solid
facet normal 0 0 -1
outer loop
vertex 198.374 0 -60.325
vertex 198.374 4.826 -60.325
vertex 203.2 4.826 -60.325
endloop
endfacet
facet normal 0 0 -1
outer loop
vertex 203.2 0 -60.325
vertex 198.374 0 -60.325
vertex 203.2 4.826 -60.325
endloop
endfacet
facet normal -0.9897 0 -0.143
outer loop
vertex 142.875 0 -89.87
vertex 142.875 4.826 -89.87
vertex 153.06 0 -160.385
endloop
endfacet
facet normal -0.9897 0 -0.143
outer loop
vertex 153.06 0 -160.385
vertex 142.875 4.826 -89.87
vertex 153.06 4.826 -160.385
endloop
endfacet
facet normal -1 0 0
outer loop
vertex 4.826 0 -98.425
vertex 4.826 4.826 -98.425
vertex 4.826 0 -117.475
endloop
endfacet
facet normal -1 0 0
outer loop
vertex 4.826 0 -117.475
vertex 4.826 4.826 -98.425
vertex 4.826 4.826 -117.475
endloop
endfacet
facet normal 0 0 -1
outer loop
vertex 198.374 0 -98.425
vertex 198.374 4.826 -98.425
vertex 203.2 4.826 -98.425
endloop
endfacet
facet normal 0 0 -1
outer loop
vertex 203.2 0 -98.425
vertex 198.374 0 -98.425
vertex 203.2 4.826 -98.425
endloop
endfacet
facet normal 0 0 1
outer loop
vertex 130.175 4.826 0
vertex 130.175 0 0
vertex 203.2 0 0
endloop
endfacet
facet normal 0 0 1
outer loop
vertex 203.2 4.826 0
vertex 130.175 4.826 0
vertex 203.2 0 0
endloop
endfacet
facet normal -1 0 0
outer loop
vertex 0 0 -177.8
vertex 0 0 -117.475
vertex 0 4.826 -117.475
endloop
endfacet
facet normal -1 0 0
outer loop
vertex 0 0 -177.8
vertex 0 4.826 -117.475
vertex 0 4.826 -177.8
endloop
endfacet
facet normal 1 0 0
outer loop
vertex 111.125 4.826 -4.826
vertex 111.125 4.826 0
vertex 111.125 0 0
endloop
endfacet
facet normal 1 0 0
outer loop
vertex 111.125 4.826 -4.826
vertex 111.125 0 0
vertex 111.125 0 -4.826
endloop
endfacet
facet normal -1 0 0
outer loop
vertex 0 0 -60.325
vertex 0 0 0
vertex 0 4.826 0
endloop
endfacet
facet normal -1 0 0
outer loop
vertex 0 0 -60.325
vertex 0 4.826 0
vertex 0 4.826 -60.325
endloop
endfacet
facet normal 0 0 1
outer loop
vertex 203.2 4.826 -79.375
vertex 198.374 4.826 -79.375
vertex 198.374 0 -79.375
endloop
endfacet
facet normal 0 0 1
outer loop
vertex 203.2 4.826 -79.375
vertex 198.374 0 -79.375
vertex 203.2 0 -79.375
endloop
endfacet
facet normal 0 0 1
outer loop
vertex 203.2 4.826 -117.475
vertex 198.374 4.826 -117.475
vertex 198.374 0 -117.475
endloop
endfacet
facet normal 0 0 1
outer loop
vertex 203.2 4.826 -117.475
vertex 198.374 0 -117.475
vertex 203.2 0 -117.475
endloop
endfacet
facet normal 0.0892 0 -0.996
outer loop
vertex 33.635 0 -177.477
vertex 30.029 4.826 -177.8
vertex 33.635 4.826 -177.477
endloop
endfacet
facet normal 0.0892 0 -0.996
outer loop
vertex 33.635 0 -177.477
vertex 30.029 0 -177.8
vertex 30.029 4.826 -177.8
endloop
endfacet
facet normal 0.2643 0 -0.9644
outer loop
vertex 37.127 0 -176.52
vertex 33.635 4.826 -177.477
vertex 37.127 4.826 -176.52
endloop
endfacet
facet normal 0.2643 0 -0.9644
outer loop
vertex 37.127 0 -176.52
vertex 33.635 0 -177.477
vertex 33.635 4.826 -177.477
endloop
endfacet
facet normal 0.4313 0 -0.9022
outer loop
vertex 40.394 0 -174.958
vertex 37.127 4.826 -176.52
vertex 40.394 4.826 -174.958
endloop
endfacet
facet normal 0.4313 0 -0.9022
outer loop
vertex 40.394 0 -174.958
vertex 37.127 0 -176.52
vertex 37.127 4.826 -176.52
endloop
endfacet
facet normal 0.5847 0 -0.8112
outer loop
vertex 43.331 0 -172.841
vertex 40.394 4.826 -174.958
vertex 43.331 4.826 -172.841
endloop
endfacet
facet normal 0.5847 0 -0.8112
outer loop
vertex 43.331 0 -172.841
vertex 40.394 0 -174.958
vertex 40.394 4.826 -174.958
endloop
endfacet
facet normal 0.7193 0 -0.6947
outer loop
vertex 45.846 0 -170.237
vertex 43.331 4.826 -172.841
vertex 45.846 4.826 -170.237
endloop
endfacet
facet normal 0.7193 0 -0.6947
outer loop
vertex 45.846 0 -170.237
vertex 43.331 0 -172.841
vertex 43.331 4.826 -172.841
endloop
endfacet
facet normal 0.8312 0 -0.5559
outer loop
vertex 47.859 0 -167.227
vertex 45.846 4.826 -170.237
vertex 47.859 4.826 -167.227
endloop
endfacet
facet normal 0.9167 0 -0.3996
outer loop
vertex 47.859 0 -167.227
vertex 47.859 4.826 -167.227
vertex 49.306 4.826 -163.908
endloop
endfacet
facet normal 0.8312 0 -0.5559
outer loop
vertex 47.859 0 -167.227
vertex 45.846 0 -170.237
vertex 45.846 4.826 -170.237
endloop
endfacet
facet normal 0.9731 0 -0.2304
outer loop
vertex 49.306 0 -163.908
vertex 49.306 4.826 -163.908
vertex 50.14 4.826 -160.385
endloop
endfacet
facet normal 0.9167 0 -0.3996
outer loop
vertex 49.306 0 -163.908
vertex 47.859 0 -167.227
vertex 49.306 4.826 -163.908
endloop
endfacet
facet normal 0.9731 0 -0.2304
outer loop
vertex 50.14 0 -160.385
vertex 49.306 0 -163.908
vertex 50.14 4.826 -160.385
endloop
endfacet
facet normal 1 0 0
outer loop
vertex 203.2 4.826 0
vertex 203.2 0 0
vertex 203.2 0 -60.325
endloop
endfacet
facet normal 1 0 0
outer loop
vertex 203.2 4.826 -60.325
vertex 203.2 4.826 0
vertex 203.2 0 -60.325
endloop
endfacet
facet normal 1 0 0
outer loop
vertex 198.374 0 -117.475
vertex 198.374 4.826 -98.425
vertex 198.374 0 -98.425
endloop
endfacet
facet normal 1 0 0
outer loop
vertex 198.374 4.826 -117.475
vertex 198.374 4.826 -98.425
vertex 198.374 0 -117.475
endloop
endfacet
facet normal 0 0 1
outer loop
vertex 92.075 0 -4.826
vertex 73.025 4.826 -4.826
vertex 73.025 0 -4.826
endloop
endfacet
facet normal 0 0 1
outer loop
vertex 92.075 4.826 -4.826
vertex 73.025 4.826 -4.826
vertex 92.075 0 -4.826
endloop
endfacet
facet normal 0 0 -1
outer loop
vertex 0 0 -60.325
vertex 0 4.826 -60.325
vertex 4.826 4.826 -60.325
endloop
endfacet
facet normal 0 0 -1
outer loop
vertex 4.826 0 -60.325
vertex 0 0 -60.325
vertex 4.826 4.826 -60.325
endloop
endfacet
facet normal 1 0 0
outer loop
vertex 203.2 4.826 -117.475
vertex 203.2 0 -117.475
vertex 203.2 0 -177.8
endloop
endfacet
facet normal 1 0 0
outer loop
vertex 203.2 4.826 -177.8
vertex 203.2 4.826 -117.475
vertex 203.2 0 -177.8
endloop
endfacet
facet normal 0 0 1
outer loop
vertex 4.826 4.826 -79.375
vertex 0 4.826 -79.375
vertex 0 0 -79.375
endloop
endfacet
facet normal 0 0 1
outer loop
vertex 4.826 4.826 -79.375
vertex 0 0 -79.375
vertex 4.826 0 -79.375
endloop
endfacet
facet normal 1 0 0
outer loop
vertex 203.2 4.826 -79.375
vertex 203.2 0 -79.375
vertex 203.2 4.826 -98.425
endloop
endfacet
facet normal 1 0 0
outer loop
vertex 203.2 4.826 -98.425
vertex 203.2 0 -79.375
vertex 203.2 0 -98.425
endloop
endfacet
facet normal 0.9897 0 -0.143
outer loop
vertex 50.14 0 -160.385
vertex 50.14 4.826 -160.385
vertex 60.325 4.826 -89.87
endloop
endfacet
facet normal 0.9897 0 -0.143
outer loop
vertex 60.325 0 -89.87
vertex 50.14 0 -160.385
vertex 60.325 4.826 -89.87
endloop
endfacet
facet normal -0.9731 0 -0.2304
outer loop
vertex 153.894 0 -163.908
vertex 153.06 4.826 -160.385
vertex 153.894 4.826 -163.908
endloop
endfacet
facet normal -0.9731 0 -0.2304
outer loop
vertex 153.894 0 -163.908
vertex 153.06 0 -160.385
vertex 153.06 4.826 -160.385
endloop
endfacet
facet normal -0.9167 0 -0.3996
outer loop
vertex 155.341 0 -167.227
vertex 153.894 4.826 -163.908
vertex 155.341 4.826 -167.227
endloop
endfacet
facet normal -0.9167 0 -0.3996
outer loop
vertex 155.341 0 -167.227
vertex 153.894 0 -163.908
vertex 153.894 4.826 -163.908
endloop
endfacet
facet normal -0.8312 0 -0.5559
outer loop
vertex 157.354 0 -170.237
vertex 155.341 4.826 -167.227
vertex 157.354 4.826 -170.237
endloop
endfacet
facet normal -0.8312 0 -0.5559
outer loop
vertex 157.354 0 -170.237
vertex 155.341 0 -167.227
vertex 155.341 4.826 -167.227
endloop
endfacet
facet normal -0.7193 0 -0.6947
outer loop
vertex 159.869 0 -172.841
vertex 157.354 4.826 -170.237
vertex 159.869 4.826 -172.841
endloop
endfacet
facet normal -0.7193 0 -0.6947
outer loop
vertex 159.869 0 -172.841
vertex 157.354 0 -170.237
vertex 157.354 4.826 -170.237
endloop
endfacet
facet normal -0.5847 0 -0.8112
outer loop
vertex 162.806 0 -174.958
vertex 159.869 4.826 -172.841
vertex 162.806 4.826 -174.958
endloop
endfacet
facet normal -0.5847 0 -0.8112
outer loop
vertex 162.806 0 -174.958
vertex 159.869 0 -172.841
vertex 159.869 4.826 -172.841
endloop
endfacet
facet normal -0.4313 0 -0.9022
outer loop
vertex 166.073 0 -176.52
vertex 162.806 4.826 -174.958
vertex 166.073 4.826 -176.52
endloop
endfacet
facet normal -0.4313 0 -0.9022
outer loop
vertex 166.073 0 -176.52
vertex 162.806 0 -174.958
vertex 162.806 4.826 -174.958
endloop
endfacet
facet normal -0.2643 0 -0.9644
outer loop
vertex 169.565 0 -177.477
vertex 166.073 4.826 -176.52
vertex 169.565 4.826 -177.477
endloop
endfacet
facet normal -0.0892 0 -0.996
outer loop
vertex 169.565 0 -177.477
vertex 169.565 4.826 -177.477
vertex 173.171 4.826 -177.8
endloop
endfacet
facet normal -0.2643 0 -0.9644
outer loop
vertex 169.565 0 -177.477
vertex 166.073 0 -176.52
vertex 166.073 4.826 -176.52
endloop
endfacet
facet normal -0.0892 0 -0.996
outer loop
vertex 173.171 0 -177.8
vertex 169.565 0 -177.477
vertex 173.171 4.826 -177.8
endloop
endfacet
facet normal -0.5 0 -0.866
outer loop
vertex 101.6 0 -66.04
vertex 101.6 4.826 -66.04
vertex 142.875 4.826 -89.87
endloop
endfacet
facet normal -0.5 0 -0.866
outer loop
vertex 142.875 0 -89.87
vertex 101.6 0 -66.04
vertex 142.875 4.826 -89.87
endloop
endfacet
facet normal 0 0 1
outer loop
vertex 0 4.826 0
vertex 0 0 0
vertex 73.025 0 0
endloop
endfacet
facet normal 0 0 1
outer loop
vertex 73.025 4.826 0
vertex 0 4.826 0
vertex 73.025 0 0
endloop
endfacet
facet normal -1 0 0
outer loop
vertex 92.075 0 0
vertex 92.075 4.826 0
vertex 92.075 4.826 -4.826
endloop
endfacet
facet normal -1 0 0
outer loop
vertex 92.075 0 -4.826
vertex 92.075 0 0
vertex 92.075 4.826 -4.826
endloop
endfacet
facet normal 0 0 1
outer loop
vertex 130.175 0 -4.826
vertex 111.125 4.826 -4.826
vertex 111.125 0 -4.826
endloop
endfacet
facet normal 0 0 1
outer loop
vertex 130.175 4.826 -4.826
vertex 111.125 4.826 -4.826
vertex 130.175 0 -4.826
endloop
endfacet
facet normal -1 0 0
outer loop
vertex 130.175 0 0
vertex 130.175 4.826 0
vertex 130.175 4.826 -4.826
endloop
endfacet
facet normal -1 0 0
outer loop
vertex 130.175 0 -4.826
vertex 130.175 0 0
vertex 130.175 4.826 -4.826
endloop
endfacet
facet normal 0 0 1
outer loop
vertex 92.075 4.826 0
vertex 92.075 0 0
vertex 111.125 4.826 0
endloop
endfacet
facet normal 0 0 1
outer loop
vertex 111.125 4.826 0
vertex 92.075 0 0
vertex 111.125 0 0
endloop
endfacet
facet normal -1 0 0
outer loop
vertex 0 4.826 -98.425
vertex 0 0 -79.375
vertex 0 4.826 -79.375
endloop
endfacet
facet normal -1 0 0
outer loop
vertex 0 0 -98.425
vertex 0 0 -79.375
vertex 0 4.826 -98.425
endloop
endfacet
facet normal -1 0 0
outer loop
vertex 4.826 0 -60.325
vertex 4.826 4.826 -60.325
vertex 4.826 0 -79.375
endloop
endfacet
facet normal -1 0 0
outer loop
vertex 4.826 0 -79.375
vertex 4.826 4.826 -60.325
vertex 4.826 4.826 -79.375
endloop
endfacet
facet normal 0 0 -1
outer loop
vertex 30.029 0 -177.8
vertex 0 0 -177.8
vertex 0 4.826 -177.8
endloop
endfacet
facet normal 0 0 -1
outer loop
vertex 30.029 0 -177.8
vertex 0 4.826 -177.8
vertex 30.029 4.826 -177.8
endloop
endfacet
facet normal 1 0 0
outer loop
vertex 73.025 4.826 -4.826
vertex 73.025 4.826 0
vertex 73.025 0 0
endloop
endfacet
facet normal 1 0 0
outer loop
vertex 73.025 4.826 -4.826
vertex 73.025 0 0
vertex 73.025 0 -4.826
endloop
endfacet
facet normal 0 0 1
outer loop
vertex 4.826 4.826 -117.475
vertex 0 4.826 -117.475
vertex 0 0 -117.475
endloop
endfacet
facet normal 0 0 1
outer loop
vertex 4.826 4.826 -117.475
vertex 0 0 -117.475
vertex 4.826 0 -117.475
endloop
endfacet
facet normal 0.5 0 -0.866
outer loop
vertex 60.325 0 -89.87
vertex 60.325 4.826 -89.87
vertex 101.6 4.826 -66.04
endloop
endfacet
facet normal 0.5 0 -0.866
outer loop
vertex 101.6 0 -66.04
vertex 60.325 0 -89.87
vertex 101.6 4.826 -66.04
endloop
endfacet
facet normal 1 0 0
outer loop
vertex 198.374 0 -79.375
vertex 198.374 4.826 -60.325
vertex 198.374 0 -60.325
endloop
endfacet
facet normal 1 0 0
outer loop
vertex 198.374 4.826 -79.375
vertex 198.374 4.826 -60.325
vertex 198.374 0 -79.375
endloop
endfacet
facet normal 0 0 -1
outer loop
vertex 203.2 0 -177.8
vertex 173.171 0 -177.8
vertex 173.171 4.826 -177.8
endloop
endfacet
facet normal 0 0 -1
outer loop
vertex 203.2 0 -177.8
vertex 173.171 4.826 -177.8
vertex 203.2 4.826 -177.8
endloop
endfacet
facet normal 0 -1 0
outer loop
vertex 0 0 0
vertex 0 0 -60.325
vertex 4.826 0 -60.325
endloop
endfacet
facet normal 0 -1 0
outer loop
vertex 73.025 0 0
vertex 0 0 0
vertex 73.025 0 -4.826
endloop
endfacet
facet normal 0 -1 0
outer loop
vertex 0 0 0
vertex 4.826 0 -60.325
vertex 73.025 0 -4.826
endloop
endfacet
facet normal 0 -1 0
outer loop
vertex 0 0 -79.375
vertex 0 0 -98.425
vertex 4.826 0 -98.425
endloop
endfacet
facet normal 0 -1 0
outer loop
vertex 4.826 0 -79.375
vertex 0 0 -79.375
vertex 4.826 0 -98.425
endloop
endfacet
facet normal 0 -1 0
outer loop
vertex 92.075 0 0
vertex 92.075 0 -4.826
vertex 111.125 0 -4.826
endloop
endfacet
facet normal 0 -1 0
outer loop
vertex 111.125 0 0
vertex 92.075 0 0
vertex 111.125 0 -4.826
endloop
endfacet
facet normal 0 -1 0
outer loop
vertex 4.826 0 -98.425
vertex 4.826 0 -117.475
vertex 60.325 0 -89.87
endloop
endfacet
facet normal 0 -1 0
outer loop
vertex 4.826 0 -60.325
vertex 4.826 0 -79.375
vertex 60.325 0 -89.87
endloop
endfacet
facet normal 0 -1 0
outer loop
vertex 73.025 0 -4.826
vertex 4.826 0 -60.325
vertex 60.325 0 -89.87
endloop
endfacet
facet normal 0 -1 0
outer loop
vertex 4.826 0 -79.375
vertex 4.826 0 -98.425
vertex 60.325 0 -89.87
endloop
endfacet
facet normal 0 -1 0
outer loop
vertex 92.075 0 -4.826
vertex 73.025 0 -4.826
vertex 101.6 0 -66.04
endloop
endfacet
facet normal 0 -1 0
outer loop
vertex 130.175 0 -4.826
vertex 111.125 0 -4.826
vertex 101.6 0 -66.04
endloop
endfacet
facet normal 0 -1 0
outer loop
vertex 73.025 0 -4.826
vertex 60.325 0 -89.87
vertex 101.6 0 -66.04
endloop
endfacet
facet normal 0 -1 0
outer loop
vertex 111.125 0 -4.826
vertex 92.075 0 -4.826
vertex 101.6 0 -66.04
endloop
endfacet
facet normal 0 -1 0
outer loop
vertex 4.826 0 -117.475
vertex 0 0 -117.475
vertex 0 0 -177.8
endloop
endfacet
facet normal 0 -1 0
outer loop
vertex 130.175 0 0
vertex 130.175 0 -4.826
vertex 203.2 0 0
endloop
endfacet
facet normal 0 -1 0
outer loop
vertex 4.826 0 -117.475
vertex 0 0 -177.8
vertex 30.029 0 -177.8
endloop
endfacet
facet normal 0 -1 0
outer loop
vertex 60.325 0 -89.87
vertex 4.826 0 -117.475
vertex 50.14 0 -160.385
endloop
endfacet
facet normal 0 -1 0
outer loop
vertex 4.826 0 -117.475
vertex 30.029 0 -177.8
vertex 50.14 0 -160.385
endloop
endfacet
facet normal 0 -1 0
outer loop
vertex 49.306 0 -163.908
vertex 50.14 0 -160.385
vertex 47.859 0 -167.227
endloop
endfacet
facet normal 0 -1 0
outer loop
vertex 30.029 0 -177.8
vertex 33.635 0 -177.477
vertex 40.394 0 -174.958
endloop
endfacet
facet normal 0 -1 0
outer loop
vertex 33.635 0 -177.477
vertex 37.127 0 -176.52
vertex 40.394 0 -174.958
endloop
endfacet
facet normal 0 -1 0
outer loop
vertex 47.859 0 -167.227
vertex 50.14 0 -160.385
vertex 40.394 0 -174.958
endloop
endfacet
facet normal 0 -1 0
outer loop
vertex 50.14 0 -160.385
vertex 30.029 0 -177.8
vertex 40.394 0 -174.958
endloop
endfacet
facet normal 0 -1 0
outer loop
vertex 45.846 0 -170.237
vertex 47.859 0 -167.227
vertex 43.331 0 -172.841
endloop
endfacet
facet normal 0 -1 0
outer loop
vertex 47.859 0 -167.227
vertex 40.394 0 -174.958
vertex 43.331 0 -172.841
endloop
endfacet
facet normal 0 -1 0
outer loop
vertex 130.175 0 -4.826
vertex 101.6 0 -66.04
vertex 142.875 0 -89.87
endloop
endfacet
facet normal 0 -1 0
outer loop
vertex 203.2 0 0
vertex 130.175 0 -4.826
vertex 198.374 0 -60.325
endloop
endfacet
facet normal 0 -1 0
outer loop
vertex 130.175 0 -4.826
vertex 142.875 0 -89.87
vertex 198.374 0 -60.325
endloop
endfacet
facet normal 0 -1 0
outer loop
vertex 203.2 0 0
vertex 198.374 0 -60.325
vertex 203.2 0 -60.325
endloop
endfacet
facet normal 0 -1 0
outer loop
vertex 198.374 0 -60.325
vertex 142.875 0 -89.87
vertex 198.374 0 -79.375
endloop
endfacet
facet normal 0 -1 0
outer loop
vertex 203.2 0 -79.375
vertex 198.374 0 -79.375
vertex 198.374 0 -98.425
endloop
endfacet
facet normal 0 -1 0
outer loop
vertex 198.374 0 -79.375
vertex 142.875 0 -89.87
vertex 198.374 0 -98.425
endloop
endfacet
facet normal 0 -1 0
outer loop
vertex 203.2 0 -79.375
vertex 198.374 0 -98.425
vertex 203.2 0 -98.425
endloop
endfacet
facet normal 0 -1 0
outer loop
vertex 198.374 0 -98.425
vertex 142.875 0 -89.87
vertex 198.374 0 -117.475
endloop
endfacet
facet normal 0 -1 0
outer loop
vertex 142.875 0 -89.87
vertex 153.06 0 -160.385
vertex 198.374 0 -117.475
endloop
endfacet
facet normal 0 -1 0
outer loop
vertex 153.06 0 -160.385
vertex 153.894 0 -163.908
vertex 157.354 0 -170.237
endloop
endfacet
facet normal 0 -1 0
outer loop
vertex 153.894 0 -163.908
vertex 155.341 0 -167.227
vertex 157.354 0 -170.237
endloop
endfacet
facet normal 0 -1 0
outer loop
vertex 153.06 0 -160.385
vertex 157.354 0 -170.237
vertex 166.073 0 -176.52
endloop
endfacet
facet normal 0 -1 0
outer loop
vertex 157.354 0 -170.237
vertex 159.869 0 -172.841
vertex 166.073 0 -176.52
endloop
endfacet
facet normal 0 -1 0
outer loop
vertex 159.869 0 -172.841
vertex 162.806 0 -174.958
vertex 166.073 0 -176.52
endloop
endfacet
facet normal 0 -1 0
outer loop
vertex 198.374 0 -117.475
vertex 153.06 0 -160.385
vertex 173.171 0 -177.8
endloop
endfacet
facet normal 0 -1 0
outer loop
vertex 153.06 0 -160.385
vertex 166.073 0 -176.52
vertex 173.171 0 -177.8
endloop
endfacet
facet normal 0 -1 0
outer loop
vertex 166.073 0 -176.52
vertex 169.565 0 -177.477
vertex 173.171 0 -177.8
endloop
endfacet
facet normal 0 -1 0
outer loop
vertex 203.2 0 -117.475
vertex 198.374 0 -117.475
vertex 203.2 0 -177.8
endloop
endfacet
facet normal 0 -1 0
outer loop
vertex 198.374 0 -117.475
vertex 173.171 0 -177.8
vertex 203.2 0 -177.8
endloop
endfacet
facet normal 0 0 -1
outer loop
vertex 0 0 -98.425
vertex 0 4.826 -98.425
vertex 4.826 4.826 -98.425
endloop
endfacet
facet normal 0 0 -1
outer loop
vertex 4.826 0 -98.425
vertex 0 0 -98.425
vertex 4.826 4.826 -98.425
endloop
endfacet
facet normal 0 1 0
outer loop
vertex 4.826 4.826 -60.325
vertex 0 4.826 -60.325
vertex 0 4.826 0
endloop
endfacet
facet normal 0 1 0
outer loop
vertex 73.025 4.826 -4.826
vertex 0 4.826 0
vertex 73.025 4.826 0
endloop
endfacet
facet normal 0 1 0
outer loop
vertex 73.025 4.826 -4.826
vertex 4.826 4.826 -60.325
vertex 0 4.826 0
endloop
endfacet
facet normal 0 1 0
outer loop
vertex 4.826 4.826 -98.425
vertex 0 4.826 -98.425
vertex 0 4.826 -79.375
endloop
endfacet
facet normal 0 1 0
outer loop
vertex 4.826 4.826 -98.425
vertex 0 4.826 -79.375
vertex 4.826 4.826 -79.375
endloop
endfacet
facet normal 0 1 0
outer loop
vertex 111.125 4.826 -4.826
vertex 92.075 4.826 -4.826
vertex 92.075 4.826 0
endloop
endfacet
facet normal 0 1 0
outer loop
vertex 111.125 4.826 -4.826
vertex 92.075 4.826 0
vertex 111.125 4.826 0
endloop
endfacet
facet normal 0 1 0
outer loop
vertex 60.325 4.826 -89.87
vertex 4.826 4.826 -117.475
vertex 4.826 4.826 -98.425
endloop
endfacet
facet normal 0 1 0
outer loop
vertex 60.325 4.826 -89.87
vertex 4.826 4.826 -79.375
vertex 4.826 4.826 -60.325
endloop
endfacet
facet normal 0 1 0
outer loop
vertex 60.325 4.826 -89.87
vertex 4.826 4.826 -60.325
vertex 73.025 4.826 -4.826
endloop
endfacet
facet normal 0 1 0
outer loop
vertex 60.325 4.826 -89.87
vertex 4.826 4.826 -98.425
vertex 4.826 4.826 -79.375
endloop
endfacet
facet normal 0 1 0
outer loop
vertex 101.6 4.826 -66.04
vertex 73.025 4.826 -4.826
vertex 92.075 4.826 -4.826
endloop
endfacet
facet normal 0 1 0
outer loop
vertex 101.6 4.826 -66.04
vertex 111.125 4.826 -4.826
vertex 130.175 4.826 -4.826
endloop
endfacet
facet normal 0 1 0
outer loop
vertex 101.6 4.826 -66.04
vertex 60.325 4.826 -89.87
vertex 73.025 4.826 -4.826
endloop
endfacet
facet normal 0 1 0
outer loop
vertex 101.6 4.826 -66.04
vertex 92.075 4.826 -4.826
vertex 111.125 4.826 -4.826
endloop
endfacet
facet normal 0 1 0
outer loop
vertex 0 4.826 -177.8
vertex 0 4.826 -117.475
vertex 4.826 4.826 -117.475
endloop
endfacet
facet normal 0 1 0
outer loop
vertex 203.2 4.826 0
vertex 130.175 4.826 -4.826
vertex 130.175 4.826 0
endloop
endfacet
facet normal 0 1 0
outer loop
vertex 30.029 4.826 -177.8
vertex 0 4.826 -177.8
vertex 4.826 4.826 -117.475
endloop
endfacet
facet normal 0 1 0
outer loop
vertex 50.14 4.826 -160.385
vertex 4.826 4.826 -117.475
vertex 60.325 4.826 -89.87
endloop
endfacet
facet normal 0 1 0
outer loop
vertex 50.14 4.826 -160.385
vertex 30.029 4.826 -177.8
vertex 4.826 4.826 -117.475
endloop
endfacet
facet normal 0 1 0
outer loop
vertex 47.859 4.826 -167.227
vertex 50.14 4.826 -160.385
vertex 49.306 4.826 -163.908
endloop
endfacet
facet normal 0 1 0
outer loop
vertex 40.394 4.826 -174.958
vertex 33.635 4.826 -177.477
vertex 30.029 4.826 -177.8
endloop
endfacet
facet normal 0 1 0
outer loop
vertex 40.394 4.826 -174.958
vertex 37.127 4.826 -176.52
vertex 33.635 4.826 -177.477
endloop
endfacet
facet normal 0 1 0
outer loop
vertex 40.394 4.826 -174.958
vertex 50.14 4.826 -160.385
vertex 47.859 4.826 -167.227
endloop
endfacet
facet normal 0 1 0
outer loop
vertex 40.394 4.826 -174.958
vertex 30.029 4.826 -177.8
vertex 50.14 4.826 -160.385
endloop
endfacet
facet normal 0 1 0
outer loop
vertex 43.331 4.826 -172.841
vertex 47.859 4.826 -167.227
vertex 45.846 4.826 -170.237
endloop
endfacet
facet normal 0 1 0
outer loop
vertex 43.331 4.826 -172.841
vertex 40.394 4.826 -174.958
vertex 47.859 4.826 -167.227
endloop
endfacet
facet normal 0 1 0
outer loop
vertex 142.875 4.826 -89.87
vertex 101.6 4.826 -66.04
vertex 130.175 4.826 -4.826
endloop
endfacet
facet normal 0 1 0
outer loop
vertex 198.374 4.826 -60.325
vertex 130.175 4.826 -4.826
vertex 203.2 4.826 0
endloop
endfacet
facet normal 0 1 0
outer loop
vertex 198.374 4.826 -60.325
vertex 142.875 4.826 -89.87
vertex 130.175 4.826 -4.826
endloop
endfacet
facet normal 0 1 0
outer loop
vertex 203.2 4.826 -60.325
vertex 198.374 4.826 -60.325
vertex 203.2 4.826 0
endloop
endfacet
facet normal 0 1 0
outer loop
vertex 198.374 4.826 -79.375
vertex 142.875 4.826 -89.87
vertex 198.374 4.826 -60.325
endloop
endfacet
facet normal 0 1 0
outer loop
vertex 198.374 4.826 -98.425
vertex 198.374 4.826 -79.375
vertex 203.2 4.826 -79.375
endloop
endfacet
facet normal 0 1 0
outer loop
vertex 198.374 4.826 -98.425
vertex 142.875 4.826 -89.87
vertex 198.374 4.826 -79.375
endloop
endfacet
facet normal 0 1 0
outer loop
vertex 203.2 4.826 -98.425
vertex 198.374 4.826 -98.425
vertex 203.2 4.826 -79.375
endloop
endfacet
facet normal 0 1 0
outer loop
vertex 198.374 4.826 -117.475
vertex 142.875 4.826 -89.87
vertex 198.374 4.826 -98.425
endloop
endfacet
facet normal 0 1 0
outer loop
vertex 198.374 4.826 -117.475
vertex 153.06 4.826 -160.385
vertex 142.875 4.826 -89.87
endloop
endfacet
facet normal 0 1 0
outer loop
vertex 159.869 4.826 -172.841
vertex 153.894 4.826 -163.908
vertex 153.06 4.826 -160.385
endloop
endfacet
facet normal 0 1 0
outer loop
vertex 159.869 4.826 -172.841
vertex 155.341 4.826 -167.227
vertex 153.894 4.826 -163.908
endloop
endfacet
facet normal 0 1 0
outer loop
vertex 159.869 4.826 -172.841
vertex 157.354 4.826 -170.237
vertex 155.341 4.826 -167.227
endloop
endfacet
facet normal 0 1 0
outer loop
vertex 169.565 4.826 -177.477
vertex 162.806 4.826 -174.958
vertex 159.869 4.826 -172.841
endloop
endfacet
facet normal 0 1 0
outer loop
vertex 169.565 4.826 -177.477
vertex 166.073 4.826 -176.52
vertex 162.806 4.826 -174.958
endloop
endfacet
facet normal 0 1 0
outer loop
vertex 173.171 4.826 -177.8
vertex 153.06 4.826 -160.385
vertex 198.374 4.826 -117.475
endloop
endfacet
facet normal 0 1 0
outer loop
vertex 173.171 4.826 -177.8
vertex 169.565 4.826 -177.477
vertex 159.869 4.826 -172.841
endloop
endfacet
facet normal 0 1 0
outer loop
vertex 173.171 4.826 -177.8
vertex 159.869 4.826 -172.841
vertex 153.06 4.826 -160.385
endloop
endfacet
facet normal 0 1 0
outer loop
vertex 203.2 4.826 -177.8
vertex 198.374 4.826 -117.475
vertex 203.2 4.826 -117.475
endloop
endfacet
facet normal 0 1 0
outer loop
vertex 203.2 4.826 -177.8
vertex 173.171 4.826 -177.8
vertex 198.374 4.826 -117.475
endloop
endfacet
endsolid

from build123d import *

# Parameters (mm, degrees)
SKETCH1_W             = 203.2
SKETCH1_H             = 177.8
BASE_DEPTH            = 4.826
CENTER_CUT_DEPTH      = 271.048829429
LEADING_EDGE_FILLET_R = 20.32
SKETCH3_W             = 4.826
SKETCH3_H             = 19.05
SIDE_SLOTS_DEPTH      = 271.048829429
SKETCH4_W             = 19.05
SKETCH4_H             = 4.826
REAR_SLOTS_DEPTH      = 271.048829429


with BuildPart() as part:
    # Sketch1 → Base (new body)
    with BuildSketch(Plane(origin=(0, 0, 0), x_dir=(1, 0, 0), z_dir=(0, 1, 0))):
        with Locations((101.6, 88.9)):
            Rectangle(SKETCH1_W, SKETCH1_H)
    extrude(amount=BASE_DEPTH)

    # Sketch2 → Center Cut (cut, through all)
    with BuildSketch(Plane(origin=(0, 4.826, 0), x_dir=(1, 0, 0), z_dir=(0, 1, 0))):
        Polygon((60.325, 89.870132361), (101.6, 66.04), (142.875, 89.870132361), (155.575, 177.8), (47.625, 177.8), align=None)
    extrude(amount=-CENTER_CUT_DEPTH, mode=Mode.SUBTRACT)

    # Leading Edge Fillet
    leading_edge_fillet_edges = [part.edges().sort_by_distance(p)[0] for p in [
        (47.625, 2.413, -177.8),
        (155.575, 2.413, -177.8),
    ]]
    fillet(leading_edge_fillet_edges, radius=LEADING_EDGE_FILLET_R)

    # Sketch3 → Side Slots (cut, through all)
    with BuildSketch(Plane(origin=(0, 4.826, 0), x_dir=(1, 0, 0), z_dir=(0, 1, 0))):
        with Locations((2.413, 107.95)):
            Rectangle(SKETCH3_W, SKETCH3_H)
        with Locations((2.413, 69.85)):
            Rectangle(SKETCH3_W, SKETCH3_H)
        with Locations((200.787, 69.85)):
            Rectangle(SKETCH3_W, SKETCH3_H)
        with Locations((200.787, 107.95)):
            Rectangle(SKETCH3_W, SKETCH3_H)
    extrude(amount=-SIDE_SLOTS_DEPTH, mode=Mode.SUBTRACT)

    # Sketch4 → Rear Slots (cut, through all)
    with BuildSketch(Plane(origin=(0, 4.826, 0), x_dir=(1, 0, 0), z_dir=(0, 1, 0))):
        with Locations((82.55, 2.413)):
            Rectangle(SKETCH4_W, SKETCH4_H)
        with Locations((120.65, 2.413)):
            Rectangle(SKETCH4_W, SKETCH4_H)
    extrude(amount=-REAR_SLOTS_DEPTH, mode=Mode.SUBTRACT)


solid = part.part
